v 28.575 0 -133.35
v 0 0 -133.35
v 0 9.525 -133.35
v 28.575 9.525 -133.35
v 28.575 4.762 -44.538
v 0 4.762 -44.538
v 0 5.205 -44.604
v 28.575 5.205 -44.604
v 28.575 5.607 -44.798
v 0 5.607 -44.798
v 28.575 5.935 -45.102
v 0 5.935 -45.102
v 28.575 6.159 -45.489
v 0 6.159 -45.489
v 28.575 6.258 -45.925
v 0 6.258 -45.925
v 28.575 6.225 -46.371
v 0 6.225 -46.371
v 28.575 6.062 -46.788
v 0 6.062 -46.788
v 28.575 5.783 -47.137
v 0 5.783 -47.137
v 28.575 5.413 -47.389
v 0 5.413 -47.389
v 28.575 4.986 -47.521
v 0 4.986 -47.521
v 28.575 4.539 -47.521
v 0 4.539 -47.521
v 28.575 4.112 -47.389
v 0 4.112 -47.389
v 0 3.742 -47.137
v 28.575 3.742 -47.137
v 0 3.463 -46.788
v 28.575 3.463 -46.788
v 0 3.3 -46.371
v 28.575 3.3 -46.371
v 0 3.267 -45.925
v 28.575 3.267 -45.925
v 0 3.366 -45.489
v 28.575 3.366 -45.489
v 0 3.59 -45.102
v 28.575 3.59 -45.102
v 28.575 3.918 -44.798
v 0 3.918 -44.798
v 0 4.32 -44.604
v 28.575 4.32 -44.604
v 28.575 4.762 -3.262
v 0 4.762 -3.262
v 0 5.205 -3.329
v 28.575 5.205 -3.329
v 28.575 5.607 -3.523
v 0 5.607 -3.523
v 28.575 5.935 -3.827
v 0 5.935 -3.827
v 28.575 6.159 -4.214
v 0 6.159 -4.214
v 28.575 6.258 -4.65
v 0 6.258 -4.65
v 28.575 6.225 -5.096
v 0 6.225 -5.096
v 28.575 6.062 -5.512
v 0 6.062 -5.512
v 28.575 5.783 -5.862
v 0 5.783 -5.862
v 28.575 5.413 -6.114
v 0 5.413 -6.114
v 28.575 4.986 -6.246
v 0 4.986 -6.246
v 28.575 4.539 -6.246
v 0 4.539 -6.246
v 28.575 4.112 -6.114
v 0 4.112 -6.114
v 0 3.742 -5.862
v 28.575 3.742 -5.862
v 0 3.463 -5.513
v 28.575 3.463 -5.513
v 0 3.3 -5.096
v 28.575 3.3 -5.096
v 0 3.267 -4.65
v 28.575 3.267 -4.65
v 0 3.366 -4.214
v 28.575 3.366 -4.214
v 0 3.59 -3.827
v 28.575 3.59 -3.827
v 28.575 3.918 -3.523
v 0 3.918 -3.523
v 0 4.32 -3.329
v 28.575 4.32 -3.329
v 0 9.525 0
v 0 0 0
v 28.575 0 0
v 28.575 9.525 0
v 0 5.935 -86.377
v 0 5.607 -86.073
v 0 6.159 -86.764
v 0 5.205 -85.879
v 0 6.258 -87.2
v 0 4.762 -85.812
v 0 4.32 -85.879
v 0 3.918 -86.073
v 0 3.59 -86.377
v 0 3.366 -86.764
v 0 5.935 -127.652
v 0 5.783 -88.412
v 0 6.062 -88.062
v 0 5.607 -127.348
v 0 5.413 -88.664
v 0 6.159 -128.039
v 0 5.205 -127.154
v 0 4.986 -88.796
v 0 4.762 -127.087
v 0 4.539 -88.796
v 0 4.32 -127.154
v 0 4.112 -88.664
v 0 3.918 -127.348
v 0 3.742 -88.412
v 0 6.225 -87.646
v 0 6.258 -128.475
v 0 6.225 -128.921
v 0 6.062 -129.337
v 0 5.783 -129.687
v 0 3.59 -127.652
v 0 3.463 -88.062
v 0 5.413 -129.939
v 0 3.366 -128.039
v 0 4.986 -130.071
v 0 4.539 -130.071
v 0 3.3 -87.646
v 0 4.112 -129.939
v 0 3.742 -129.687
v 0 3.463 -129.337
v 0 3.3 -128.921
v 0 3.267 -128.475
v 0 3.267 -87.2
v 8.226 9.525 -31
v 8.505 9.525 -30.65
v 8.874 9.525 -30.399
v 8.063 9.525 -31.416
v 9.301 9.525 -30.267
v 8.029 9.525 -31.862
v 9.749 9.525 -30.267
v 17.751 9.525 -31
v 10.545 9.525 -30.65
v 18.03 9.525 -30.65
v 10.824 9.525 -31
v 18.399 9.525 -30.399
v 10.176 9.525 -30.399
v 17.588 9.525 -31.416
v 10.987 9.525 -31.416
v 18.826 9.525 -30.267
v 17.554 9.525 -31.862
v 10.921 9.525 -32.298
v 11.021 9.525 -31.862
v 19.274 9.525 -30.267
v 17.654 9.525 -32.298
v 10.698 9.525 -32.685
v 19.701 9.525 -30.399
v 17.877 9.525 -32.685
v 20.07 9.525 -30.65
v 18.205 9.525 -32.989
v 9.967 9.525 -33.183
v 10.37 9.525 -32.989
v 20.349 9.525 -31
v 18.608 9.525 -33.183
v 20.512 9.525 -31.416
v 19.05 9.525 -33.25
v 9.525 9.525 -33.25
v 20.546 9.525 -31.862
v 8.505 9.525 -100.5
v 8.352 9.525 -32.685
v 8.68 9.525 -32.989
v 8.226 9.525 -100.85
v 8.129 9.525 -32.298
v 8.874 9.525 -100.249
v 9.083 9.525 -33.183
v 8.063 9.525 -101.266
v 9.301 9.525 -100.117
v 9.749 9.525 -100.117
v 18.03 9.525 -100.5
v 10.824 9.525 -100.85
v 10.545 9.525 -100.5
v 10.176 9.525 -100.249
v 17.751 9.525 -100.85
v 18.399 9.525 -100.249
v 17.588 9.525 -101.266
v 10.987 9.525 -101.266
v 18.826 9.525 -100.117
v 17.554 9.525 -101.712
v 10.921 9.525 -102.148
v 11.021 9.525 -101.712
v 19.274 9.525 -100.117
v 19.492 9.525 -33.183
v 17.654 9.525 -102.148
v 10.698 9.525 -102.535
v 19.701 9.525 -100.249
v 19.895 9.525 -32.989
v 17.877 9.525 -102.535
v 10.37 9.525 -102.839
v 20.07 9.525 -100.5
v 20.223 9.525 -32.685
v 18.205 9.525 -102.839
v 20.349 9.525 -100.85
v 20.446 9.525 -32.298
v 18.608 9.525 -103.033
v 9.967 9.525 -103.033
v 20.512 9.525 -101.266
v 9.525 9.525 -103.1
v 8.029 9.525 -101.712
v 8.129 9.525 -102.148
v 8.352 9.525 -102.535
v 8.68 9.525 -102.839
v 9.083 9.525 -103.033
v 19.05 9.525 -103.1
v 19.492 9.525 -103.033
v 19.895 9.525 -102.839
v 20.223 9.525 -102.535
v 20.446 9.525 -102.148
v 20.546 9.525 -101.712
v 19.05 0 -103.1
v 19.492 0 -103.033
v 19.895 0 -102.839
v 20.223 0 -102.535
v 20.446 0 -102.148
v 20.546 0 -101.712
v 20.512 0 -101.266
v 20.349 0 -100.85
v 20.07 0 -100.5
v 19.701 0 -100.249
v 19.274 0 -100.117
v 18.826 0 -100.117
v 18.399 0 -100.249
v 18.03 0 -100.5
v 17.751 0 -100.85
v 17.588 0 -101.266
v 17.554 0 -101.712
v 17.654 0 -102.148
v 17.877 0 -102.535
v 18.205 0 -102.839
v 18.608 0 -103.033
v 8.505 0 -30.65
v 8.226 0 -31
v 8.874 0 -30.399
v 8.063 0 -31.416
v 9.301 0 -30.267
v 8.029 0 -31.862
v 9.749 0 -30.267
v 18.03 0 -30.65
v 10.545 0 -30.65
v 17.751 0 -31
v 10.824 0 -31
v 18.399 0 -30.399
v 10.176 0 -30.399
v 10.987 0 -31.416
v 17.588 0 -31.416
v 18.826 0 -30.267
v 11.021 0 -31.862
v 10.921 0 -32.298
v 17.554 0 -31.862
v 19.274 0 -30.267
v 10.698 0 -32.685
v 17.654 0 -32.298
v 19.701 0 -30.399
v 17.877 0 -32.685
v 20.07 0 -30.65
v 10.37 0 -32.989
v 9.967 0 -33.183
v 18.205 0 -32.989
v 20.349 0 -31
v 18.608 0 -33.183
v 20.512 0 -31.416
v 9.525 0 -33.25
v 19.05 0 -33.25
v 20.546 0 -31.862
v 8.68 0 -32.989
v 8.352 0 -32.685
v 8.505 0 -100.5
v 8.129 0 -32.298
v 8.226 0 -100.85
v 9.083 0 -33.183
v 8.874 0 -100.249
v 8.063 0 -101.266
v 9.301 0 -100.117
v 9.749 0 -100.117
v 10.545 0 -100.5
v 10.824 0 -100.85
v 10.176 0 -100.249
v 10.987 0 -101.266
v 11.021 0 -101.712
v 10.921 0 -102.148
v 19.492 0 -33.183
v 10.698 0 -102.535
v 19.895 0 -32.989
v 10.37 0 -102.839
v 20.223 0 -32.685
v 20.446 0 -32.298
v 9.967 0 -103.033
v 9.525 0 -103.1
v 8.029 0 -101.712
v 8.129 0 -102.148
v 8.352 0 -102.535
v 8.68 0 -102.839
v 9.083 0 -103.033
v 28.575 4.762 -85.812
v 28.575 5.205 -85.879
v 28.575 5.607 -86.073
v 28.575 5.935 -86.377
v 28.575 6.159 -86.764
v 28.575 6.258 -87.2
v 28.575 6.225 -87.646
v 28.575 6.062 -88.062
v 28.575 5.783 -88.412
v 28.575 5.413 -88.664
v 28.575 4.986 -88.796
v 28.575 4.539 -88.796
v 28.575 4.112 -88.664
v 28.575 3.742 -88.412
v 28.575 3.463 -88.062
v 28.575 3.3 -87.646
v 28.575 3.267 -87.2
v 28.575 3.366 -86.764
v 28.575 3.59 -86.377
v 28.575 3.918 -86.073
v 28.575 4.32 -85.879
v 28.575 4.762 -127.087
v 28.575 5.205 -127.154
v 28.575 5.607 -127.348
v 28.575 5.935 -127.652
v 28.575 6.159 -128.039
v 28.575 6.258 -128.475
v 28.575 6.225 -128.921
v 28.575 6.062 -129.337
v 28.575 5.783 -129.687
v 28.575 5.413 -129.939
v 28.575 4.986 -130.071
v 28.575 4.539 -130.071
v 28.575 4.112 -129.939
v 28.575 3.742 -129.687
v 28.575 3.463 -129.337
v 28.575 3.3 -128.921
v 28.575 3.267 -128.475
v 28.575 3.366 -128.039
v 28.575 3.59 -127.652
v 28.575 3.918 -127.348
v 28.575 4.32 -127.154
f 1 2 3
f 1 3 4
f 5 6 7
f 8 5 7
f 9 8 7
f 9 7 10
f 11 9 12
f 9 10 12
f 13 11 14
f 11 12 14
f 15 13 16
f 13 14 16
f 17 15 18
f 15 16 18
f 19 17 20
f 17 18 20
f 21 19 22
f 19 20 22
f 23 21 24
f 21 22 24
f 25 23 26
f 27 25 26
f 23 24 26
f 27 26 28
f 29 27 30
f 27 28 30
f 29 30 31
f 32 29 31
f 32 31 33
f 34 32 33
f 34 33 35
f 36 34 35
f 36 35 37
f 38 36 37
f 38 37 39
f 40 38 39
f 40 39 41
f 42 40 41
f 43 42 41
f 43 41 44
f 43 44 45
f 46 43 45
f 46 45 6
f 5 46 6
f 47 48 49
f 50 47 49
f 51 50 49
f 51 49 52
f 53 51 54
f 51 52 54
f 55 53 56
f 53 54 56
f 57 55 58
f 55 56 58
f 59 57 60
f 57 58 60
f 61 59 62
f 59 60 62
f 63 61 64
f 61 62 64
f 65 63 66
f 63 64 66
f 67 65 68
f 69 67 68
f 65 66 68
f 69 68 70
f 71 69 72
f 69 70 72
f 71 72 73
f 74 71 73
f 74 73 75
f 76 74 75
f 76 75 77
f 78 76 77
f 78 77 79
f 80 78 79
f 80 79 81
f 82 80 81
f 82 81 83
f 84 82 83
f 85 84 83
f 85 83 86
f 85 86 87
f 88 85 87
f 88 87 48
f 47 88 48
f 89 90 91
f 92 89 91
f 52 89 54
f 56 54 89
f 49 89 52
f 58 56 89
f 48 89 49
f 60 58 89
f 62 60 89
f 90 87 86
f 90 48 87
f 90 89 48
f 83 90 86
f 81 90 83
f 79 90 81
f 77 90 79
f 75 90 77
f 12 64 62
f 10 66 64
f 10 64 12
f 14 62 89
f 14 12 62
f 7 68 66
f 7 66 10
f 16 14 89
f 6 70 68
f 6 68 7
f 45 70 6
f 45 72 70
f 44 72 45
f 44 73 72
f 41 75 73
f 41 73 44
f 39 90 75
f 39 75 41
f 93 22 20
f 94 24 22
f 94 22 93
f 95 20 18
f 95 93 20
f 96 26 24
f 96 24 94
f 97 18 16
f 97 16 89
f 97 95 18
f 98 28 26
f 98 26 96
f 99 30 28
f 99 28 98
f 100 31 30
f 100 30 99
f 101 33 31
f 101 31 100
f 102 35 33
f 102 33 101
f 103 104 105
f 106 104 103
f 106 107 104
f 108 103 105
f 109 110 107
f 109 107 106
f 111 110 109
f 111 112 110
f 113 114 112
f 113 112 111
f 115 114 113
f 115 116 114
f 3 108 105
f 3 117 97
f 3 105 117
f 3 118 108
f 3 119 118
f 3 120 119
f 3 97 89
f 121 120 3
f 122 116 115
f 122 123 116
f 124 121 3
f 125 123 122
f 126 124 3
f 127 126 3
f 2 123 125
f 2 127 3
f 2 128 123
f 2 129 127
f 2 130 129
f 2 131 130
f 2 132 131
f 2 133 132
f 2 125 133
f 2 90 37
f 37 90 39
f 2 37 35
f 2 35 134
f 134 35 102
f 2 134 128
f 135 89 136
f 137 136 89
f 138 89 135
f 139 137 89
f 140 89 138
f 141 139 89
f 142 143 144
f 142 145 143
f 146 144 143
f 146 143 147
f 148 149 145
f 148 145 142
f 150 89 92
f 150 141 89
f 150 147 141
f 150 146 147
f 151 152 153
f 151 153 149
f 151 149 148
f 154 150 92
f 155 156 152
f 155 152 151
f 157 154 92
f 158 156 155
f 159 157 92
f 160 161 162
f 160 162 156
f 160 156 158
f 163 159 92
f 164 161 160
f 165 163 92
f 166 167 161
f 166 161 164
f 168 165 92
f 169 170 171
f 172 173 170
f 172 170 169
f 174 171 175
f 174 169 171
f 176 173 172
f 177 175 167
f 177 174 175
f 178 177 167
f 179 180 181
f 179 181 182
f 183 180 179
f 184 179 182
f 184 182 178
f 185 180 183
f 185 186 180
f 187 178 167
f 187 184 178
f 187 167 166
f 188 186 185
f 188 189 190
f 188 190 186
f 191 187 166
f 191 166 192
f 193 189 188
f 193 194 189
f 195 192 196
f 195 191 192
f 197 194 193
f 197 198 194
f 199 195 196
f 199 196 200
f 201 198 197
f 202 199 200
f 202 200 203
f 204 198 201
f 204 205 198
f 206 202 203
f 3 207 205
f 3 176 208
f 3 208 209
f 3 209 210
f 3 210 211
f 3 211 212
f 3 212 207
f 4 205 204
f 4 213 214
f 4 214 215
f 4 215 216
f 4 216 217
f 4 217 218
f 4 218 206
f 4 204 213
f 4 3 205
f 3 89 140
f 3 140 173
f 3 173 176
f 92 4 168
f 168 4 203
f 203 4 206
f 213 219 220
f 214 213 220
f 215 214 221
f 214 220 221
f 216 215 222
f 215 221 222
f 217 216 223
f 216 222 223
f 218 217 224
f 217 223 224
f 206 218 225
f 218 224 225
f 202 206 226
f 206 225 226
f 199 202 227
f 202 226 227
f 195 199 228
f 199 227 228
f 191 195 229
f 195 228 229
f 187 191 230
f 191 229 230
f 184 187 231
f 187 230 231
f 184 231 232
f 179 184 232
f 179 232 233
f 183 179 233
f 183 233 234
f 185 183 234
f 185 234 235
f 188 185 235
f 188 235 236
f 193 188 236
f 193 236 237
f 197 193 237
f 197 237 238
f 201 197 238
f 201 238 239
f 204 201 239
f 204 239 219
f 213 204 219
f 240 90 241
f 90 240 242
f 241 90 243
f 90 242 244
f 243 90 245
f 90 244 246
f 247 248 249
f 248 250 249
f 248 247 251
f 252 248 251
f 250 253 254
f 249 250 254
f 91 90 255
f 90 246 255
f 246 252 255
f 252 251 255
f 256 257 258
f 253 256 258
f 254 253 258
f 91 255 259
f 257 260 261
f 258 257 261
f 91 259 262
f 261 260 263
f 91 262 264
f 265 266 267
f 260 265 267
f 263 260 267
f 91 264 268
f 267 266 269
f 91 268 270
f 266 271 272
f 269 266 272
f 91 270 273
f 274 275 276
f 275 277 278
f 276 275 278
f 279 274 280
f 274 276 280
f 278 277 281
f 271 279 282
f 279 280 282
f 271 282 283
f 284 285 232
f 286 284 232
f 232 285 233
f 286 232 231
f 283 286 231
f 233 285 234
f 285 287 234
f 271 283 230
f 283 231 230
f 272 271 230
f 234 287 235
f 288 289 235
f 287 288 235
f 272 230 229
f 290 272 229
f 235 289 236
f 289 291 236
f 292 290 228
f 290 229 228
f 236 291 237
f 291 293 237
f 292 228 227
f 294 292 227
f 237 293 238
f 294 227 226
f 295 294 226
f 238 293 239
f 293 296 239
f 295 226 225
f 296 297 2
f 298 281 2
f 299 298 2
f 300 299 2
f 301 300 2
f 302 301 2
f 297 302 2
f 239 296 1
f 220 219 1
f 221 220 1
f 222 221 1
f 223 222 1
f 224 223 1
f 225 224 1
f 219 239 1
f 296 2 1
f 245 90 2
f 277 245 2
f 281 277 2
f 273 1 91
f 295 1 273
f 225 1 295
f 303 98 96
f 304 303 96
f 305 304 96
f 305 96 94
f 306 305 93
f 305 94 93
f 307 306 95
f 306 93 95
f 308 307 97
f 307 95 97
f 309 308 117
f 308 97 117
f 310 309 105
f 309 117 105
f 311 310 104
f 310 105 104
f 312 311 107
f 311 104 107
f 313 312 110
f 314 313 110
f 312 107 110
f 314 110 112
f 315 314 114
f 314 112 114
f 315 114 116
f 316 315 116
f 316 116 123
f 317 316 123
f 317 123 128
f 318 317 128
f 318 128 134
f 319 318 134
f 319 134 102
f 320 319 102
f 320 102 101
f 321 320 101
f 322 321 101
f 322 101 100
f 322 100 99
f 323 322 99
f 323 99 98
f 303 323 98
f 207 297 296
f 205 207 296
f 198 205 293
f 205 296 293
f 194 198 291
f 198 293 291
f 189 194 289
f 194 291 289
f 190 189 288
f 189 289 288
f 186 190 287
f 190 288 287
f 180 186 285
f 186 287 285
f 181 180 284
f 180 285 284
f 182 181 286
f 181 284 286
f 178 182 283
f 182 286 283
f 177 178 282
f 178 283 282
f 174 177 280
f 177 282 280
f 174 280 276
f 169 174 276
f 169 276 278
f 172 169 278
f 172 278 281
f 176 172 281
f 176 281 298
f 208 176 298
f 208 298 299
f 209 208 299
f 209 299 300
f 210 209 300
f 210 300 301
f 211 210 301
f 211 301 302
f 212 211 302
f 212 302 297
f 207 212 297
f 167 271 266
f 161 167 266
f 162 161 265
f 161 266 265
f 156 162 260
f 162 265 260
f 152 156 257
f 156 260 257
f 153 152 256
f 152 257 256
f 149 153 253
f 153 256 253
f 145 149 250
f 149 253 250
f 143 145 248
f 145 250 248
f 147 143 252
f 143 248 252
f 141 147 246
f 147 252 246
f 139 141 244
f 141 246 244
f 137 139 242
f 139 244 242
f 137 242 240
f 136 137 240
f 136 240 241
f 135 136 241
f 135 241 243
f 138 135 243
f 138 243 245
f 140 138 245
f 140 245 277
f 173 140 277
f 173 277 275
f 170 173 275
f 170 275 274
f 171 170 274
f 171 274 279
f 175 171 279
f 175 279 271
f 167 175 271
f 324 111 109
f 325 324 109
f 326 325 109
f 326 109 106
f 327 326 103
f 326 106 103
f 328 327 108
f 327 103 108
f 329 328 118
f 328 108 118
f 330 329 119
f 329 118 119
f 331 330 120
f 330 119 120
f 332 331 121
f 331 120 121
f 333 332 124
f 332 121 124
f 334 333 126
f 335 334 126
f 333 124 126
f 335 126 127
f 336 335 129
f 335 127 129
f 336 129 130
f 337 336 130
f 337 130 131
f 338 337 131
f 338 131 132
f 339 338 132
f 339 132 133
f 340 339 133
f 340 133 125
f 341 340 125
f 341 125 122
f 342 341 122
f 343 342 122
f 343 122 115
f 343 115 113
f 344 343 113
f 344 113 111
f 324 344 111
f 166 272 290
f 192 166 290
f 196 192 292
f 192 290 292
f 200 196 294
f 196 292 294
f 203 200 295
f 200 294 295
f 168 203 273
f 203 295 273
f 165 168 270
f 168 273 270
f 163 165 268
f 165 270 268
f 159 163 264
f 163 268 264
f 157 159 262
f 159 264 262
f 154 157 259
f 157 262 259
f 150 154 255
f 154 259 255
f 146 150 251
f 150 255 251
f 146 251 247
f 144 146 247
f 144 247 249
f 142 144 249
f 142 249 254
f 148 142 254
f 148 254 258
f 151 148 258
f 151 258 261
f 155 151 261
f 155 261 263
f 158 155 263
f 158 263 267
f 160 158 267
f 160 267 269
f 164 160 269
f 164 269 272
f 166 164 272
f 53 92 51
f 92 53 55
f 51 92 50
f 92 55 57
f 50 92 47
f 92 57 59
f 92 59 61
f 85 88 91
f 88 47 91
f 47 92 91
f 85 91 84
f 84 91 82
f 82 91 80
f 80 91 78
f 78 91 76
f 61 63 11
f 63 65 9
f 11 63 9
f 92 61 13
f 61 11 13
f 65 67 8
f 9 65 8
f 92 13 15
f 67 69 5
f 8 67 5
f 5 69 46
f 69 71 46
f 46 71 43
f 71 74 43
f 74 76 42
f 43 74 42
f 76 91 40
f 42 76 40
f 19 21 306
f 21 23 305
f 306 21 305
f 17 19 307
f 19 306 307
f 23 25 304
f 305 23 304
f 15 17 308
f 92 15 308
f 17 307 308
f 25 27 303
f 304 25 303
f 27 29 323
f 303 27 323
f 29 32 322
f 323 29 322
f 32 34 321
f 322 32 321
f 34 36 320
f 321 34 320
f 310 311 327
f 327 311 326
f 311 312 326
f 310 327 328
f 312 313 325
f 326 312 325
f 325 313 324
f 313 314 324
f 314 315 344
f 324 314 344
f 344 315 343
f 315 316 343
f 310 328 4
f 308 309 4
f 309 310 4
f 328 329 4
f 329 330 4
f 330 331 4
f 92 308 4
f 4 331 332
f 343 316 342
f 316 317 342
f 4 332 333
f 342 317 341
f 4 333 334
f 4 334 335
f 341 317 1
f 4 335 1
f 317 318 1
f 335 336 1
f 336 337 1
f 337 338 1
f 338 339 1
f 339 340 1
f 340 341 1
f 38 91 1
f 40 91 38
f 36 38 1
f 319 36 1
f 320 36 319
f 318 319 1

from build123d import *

# Parameters (mm, degrees)
SKETCH2_W             = 28.575
SKETCH2_H             = 133.35
BOSS_EXTRUDE1_DEPTH   = 9.525
F_3_0MM_DOWEL_HOLE1_D = 3
LPATTERN1_COUNT       = 4
LPATTERN1_PITCH       = 41.275
SKETCH8_R             = 1.5
CUT_EXTRUDE2_DEPTH    = 137.709468399


with BuildPart() as part:
    # Sketch2 → Boss-Extrude1 (new body)
    with BuildSketch(Plane(origin=(0, 0, 0), x_dir=(1, 0, 0), z_dir=(0, 1, 0))):
        with Locations((14.2875, 66.675)):
            Rectangle(SKETCH2_W, SKETCH2_H)
    extrude(amount=BOSS_EXTRUDE1_DEPTH)

    # Ø3.0mm Dowel Hole1 (through all)
    with Locations(Plane(origin=(28.575, 0, 0), x_dir=(0, 0, -1), z_dir=(1, 0, 0))):
        with Locations((4.7625, 4.7625)):
            f_3_0mm_dowel_hole1 = Hole(F_3_0MM_DOWEL_HOLE1_D / 2)

    # LPattern1: Ø3.0mm Dowel Hole1 ×4
    with Locations(*[(0, 0, -i * LPATTERN1_PITCH) for i in range(1, LPATTERN1_COUNT)]):
        add(f_3_0mm_dowel_hole1, mode=Mode.SUBTRACT)

    # Sketch8 → Cut-Extrude2 (cut, through all)
    with BuildSketch(Plane.XZ):
        with Locations(Location((9.525, -31.75, 0), (0, 0, 270))):
            Circle(SKETCH8_R)
        with Locations(Location((9.525, -101.6, 0), (0, 0, 270))):
            Circle(SKETCH8_R)
        with Locations(Location((19.05, -101.6, 0), (0, 0, 270))):
            Circle(SKETCH8_R)
        with Locations(Location((19.05, -31.75, 0), (0, 0, 270))):
            Circle(SKETCH8_R)
    extrude(amount=-CUT_EXTRUDE2_DEPTH, mode=Mode.SUBTRACT)


solid = part.part
